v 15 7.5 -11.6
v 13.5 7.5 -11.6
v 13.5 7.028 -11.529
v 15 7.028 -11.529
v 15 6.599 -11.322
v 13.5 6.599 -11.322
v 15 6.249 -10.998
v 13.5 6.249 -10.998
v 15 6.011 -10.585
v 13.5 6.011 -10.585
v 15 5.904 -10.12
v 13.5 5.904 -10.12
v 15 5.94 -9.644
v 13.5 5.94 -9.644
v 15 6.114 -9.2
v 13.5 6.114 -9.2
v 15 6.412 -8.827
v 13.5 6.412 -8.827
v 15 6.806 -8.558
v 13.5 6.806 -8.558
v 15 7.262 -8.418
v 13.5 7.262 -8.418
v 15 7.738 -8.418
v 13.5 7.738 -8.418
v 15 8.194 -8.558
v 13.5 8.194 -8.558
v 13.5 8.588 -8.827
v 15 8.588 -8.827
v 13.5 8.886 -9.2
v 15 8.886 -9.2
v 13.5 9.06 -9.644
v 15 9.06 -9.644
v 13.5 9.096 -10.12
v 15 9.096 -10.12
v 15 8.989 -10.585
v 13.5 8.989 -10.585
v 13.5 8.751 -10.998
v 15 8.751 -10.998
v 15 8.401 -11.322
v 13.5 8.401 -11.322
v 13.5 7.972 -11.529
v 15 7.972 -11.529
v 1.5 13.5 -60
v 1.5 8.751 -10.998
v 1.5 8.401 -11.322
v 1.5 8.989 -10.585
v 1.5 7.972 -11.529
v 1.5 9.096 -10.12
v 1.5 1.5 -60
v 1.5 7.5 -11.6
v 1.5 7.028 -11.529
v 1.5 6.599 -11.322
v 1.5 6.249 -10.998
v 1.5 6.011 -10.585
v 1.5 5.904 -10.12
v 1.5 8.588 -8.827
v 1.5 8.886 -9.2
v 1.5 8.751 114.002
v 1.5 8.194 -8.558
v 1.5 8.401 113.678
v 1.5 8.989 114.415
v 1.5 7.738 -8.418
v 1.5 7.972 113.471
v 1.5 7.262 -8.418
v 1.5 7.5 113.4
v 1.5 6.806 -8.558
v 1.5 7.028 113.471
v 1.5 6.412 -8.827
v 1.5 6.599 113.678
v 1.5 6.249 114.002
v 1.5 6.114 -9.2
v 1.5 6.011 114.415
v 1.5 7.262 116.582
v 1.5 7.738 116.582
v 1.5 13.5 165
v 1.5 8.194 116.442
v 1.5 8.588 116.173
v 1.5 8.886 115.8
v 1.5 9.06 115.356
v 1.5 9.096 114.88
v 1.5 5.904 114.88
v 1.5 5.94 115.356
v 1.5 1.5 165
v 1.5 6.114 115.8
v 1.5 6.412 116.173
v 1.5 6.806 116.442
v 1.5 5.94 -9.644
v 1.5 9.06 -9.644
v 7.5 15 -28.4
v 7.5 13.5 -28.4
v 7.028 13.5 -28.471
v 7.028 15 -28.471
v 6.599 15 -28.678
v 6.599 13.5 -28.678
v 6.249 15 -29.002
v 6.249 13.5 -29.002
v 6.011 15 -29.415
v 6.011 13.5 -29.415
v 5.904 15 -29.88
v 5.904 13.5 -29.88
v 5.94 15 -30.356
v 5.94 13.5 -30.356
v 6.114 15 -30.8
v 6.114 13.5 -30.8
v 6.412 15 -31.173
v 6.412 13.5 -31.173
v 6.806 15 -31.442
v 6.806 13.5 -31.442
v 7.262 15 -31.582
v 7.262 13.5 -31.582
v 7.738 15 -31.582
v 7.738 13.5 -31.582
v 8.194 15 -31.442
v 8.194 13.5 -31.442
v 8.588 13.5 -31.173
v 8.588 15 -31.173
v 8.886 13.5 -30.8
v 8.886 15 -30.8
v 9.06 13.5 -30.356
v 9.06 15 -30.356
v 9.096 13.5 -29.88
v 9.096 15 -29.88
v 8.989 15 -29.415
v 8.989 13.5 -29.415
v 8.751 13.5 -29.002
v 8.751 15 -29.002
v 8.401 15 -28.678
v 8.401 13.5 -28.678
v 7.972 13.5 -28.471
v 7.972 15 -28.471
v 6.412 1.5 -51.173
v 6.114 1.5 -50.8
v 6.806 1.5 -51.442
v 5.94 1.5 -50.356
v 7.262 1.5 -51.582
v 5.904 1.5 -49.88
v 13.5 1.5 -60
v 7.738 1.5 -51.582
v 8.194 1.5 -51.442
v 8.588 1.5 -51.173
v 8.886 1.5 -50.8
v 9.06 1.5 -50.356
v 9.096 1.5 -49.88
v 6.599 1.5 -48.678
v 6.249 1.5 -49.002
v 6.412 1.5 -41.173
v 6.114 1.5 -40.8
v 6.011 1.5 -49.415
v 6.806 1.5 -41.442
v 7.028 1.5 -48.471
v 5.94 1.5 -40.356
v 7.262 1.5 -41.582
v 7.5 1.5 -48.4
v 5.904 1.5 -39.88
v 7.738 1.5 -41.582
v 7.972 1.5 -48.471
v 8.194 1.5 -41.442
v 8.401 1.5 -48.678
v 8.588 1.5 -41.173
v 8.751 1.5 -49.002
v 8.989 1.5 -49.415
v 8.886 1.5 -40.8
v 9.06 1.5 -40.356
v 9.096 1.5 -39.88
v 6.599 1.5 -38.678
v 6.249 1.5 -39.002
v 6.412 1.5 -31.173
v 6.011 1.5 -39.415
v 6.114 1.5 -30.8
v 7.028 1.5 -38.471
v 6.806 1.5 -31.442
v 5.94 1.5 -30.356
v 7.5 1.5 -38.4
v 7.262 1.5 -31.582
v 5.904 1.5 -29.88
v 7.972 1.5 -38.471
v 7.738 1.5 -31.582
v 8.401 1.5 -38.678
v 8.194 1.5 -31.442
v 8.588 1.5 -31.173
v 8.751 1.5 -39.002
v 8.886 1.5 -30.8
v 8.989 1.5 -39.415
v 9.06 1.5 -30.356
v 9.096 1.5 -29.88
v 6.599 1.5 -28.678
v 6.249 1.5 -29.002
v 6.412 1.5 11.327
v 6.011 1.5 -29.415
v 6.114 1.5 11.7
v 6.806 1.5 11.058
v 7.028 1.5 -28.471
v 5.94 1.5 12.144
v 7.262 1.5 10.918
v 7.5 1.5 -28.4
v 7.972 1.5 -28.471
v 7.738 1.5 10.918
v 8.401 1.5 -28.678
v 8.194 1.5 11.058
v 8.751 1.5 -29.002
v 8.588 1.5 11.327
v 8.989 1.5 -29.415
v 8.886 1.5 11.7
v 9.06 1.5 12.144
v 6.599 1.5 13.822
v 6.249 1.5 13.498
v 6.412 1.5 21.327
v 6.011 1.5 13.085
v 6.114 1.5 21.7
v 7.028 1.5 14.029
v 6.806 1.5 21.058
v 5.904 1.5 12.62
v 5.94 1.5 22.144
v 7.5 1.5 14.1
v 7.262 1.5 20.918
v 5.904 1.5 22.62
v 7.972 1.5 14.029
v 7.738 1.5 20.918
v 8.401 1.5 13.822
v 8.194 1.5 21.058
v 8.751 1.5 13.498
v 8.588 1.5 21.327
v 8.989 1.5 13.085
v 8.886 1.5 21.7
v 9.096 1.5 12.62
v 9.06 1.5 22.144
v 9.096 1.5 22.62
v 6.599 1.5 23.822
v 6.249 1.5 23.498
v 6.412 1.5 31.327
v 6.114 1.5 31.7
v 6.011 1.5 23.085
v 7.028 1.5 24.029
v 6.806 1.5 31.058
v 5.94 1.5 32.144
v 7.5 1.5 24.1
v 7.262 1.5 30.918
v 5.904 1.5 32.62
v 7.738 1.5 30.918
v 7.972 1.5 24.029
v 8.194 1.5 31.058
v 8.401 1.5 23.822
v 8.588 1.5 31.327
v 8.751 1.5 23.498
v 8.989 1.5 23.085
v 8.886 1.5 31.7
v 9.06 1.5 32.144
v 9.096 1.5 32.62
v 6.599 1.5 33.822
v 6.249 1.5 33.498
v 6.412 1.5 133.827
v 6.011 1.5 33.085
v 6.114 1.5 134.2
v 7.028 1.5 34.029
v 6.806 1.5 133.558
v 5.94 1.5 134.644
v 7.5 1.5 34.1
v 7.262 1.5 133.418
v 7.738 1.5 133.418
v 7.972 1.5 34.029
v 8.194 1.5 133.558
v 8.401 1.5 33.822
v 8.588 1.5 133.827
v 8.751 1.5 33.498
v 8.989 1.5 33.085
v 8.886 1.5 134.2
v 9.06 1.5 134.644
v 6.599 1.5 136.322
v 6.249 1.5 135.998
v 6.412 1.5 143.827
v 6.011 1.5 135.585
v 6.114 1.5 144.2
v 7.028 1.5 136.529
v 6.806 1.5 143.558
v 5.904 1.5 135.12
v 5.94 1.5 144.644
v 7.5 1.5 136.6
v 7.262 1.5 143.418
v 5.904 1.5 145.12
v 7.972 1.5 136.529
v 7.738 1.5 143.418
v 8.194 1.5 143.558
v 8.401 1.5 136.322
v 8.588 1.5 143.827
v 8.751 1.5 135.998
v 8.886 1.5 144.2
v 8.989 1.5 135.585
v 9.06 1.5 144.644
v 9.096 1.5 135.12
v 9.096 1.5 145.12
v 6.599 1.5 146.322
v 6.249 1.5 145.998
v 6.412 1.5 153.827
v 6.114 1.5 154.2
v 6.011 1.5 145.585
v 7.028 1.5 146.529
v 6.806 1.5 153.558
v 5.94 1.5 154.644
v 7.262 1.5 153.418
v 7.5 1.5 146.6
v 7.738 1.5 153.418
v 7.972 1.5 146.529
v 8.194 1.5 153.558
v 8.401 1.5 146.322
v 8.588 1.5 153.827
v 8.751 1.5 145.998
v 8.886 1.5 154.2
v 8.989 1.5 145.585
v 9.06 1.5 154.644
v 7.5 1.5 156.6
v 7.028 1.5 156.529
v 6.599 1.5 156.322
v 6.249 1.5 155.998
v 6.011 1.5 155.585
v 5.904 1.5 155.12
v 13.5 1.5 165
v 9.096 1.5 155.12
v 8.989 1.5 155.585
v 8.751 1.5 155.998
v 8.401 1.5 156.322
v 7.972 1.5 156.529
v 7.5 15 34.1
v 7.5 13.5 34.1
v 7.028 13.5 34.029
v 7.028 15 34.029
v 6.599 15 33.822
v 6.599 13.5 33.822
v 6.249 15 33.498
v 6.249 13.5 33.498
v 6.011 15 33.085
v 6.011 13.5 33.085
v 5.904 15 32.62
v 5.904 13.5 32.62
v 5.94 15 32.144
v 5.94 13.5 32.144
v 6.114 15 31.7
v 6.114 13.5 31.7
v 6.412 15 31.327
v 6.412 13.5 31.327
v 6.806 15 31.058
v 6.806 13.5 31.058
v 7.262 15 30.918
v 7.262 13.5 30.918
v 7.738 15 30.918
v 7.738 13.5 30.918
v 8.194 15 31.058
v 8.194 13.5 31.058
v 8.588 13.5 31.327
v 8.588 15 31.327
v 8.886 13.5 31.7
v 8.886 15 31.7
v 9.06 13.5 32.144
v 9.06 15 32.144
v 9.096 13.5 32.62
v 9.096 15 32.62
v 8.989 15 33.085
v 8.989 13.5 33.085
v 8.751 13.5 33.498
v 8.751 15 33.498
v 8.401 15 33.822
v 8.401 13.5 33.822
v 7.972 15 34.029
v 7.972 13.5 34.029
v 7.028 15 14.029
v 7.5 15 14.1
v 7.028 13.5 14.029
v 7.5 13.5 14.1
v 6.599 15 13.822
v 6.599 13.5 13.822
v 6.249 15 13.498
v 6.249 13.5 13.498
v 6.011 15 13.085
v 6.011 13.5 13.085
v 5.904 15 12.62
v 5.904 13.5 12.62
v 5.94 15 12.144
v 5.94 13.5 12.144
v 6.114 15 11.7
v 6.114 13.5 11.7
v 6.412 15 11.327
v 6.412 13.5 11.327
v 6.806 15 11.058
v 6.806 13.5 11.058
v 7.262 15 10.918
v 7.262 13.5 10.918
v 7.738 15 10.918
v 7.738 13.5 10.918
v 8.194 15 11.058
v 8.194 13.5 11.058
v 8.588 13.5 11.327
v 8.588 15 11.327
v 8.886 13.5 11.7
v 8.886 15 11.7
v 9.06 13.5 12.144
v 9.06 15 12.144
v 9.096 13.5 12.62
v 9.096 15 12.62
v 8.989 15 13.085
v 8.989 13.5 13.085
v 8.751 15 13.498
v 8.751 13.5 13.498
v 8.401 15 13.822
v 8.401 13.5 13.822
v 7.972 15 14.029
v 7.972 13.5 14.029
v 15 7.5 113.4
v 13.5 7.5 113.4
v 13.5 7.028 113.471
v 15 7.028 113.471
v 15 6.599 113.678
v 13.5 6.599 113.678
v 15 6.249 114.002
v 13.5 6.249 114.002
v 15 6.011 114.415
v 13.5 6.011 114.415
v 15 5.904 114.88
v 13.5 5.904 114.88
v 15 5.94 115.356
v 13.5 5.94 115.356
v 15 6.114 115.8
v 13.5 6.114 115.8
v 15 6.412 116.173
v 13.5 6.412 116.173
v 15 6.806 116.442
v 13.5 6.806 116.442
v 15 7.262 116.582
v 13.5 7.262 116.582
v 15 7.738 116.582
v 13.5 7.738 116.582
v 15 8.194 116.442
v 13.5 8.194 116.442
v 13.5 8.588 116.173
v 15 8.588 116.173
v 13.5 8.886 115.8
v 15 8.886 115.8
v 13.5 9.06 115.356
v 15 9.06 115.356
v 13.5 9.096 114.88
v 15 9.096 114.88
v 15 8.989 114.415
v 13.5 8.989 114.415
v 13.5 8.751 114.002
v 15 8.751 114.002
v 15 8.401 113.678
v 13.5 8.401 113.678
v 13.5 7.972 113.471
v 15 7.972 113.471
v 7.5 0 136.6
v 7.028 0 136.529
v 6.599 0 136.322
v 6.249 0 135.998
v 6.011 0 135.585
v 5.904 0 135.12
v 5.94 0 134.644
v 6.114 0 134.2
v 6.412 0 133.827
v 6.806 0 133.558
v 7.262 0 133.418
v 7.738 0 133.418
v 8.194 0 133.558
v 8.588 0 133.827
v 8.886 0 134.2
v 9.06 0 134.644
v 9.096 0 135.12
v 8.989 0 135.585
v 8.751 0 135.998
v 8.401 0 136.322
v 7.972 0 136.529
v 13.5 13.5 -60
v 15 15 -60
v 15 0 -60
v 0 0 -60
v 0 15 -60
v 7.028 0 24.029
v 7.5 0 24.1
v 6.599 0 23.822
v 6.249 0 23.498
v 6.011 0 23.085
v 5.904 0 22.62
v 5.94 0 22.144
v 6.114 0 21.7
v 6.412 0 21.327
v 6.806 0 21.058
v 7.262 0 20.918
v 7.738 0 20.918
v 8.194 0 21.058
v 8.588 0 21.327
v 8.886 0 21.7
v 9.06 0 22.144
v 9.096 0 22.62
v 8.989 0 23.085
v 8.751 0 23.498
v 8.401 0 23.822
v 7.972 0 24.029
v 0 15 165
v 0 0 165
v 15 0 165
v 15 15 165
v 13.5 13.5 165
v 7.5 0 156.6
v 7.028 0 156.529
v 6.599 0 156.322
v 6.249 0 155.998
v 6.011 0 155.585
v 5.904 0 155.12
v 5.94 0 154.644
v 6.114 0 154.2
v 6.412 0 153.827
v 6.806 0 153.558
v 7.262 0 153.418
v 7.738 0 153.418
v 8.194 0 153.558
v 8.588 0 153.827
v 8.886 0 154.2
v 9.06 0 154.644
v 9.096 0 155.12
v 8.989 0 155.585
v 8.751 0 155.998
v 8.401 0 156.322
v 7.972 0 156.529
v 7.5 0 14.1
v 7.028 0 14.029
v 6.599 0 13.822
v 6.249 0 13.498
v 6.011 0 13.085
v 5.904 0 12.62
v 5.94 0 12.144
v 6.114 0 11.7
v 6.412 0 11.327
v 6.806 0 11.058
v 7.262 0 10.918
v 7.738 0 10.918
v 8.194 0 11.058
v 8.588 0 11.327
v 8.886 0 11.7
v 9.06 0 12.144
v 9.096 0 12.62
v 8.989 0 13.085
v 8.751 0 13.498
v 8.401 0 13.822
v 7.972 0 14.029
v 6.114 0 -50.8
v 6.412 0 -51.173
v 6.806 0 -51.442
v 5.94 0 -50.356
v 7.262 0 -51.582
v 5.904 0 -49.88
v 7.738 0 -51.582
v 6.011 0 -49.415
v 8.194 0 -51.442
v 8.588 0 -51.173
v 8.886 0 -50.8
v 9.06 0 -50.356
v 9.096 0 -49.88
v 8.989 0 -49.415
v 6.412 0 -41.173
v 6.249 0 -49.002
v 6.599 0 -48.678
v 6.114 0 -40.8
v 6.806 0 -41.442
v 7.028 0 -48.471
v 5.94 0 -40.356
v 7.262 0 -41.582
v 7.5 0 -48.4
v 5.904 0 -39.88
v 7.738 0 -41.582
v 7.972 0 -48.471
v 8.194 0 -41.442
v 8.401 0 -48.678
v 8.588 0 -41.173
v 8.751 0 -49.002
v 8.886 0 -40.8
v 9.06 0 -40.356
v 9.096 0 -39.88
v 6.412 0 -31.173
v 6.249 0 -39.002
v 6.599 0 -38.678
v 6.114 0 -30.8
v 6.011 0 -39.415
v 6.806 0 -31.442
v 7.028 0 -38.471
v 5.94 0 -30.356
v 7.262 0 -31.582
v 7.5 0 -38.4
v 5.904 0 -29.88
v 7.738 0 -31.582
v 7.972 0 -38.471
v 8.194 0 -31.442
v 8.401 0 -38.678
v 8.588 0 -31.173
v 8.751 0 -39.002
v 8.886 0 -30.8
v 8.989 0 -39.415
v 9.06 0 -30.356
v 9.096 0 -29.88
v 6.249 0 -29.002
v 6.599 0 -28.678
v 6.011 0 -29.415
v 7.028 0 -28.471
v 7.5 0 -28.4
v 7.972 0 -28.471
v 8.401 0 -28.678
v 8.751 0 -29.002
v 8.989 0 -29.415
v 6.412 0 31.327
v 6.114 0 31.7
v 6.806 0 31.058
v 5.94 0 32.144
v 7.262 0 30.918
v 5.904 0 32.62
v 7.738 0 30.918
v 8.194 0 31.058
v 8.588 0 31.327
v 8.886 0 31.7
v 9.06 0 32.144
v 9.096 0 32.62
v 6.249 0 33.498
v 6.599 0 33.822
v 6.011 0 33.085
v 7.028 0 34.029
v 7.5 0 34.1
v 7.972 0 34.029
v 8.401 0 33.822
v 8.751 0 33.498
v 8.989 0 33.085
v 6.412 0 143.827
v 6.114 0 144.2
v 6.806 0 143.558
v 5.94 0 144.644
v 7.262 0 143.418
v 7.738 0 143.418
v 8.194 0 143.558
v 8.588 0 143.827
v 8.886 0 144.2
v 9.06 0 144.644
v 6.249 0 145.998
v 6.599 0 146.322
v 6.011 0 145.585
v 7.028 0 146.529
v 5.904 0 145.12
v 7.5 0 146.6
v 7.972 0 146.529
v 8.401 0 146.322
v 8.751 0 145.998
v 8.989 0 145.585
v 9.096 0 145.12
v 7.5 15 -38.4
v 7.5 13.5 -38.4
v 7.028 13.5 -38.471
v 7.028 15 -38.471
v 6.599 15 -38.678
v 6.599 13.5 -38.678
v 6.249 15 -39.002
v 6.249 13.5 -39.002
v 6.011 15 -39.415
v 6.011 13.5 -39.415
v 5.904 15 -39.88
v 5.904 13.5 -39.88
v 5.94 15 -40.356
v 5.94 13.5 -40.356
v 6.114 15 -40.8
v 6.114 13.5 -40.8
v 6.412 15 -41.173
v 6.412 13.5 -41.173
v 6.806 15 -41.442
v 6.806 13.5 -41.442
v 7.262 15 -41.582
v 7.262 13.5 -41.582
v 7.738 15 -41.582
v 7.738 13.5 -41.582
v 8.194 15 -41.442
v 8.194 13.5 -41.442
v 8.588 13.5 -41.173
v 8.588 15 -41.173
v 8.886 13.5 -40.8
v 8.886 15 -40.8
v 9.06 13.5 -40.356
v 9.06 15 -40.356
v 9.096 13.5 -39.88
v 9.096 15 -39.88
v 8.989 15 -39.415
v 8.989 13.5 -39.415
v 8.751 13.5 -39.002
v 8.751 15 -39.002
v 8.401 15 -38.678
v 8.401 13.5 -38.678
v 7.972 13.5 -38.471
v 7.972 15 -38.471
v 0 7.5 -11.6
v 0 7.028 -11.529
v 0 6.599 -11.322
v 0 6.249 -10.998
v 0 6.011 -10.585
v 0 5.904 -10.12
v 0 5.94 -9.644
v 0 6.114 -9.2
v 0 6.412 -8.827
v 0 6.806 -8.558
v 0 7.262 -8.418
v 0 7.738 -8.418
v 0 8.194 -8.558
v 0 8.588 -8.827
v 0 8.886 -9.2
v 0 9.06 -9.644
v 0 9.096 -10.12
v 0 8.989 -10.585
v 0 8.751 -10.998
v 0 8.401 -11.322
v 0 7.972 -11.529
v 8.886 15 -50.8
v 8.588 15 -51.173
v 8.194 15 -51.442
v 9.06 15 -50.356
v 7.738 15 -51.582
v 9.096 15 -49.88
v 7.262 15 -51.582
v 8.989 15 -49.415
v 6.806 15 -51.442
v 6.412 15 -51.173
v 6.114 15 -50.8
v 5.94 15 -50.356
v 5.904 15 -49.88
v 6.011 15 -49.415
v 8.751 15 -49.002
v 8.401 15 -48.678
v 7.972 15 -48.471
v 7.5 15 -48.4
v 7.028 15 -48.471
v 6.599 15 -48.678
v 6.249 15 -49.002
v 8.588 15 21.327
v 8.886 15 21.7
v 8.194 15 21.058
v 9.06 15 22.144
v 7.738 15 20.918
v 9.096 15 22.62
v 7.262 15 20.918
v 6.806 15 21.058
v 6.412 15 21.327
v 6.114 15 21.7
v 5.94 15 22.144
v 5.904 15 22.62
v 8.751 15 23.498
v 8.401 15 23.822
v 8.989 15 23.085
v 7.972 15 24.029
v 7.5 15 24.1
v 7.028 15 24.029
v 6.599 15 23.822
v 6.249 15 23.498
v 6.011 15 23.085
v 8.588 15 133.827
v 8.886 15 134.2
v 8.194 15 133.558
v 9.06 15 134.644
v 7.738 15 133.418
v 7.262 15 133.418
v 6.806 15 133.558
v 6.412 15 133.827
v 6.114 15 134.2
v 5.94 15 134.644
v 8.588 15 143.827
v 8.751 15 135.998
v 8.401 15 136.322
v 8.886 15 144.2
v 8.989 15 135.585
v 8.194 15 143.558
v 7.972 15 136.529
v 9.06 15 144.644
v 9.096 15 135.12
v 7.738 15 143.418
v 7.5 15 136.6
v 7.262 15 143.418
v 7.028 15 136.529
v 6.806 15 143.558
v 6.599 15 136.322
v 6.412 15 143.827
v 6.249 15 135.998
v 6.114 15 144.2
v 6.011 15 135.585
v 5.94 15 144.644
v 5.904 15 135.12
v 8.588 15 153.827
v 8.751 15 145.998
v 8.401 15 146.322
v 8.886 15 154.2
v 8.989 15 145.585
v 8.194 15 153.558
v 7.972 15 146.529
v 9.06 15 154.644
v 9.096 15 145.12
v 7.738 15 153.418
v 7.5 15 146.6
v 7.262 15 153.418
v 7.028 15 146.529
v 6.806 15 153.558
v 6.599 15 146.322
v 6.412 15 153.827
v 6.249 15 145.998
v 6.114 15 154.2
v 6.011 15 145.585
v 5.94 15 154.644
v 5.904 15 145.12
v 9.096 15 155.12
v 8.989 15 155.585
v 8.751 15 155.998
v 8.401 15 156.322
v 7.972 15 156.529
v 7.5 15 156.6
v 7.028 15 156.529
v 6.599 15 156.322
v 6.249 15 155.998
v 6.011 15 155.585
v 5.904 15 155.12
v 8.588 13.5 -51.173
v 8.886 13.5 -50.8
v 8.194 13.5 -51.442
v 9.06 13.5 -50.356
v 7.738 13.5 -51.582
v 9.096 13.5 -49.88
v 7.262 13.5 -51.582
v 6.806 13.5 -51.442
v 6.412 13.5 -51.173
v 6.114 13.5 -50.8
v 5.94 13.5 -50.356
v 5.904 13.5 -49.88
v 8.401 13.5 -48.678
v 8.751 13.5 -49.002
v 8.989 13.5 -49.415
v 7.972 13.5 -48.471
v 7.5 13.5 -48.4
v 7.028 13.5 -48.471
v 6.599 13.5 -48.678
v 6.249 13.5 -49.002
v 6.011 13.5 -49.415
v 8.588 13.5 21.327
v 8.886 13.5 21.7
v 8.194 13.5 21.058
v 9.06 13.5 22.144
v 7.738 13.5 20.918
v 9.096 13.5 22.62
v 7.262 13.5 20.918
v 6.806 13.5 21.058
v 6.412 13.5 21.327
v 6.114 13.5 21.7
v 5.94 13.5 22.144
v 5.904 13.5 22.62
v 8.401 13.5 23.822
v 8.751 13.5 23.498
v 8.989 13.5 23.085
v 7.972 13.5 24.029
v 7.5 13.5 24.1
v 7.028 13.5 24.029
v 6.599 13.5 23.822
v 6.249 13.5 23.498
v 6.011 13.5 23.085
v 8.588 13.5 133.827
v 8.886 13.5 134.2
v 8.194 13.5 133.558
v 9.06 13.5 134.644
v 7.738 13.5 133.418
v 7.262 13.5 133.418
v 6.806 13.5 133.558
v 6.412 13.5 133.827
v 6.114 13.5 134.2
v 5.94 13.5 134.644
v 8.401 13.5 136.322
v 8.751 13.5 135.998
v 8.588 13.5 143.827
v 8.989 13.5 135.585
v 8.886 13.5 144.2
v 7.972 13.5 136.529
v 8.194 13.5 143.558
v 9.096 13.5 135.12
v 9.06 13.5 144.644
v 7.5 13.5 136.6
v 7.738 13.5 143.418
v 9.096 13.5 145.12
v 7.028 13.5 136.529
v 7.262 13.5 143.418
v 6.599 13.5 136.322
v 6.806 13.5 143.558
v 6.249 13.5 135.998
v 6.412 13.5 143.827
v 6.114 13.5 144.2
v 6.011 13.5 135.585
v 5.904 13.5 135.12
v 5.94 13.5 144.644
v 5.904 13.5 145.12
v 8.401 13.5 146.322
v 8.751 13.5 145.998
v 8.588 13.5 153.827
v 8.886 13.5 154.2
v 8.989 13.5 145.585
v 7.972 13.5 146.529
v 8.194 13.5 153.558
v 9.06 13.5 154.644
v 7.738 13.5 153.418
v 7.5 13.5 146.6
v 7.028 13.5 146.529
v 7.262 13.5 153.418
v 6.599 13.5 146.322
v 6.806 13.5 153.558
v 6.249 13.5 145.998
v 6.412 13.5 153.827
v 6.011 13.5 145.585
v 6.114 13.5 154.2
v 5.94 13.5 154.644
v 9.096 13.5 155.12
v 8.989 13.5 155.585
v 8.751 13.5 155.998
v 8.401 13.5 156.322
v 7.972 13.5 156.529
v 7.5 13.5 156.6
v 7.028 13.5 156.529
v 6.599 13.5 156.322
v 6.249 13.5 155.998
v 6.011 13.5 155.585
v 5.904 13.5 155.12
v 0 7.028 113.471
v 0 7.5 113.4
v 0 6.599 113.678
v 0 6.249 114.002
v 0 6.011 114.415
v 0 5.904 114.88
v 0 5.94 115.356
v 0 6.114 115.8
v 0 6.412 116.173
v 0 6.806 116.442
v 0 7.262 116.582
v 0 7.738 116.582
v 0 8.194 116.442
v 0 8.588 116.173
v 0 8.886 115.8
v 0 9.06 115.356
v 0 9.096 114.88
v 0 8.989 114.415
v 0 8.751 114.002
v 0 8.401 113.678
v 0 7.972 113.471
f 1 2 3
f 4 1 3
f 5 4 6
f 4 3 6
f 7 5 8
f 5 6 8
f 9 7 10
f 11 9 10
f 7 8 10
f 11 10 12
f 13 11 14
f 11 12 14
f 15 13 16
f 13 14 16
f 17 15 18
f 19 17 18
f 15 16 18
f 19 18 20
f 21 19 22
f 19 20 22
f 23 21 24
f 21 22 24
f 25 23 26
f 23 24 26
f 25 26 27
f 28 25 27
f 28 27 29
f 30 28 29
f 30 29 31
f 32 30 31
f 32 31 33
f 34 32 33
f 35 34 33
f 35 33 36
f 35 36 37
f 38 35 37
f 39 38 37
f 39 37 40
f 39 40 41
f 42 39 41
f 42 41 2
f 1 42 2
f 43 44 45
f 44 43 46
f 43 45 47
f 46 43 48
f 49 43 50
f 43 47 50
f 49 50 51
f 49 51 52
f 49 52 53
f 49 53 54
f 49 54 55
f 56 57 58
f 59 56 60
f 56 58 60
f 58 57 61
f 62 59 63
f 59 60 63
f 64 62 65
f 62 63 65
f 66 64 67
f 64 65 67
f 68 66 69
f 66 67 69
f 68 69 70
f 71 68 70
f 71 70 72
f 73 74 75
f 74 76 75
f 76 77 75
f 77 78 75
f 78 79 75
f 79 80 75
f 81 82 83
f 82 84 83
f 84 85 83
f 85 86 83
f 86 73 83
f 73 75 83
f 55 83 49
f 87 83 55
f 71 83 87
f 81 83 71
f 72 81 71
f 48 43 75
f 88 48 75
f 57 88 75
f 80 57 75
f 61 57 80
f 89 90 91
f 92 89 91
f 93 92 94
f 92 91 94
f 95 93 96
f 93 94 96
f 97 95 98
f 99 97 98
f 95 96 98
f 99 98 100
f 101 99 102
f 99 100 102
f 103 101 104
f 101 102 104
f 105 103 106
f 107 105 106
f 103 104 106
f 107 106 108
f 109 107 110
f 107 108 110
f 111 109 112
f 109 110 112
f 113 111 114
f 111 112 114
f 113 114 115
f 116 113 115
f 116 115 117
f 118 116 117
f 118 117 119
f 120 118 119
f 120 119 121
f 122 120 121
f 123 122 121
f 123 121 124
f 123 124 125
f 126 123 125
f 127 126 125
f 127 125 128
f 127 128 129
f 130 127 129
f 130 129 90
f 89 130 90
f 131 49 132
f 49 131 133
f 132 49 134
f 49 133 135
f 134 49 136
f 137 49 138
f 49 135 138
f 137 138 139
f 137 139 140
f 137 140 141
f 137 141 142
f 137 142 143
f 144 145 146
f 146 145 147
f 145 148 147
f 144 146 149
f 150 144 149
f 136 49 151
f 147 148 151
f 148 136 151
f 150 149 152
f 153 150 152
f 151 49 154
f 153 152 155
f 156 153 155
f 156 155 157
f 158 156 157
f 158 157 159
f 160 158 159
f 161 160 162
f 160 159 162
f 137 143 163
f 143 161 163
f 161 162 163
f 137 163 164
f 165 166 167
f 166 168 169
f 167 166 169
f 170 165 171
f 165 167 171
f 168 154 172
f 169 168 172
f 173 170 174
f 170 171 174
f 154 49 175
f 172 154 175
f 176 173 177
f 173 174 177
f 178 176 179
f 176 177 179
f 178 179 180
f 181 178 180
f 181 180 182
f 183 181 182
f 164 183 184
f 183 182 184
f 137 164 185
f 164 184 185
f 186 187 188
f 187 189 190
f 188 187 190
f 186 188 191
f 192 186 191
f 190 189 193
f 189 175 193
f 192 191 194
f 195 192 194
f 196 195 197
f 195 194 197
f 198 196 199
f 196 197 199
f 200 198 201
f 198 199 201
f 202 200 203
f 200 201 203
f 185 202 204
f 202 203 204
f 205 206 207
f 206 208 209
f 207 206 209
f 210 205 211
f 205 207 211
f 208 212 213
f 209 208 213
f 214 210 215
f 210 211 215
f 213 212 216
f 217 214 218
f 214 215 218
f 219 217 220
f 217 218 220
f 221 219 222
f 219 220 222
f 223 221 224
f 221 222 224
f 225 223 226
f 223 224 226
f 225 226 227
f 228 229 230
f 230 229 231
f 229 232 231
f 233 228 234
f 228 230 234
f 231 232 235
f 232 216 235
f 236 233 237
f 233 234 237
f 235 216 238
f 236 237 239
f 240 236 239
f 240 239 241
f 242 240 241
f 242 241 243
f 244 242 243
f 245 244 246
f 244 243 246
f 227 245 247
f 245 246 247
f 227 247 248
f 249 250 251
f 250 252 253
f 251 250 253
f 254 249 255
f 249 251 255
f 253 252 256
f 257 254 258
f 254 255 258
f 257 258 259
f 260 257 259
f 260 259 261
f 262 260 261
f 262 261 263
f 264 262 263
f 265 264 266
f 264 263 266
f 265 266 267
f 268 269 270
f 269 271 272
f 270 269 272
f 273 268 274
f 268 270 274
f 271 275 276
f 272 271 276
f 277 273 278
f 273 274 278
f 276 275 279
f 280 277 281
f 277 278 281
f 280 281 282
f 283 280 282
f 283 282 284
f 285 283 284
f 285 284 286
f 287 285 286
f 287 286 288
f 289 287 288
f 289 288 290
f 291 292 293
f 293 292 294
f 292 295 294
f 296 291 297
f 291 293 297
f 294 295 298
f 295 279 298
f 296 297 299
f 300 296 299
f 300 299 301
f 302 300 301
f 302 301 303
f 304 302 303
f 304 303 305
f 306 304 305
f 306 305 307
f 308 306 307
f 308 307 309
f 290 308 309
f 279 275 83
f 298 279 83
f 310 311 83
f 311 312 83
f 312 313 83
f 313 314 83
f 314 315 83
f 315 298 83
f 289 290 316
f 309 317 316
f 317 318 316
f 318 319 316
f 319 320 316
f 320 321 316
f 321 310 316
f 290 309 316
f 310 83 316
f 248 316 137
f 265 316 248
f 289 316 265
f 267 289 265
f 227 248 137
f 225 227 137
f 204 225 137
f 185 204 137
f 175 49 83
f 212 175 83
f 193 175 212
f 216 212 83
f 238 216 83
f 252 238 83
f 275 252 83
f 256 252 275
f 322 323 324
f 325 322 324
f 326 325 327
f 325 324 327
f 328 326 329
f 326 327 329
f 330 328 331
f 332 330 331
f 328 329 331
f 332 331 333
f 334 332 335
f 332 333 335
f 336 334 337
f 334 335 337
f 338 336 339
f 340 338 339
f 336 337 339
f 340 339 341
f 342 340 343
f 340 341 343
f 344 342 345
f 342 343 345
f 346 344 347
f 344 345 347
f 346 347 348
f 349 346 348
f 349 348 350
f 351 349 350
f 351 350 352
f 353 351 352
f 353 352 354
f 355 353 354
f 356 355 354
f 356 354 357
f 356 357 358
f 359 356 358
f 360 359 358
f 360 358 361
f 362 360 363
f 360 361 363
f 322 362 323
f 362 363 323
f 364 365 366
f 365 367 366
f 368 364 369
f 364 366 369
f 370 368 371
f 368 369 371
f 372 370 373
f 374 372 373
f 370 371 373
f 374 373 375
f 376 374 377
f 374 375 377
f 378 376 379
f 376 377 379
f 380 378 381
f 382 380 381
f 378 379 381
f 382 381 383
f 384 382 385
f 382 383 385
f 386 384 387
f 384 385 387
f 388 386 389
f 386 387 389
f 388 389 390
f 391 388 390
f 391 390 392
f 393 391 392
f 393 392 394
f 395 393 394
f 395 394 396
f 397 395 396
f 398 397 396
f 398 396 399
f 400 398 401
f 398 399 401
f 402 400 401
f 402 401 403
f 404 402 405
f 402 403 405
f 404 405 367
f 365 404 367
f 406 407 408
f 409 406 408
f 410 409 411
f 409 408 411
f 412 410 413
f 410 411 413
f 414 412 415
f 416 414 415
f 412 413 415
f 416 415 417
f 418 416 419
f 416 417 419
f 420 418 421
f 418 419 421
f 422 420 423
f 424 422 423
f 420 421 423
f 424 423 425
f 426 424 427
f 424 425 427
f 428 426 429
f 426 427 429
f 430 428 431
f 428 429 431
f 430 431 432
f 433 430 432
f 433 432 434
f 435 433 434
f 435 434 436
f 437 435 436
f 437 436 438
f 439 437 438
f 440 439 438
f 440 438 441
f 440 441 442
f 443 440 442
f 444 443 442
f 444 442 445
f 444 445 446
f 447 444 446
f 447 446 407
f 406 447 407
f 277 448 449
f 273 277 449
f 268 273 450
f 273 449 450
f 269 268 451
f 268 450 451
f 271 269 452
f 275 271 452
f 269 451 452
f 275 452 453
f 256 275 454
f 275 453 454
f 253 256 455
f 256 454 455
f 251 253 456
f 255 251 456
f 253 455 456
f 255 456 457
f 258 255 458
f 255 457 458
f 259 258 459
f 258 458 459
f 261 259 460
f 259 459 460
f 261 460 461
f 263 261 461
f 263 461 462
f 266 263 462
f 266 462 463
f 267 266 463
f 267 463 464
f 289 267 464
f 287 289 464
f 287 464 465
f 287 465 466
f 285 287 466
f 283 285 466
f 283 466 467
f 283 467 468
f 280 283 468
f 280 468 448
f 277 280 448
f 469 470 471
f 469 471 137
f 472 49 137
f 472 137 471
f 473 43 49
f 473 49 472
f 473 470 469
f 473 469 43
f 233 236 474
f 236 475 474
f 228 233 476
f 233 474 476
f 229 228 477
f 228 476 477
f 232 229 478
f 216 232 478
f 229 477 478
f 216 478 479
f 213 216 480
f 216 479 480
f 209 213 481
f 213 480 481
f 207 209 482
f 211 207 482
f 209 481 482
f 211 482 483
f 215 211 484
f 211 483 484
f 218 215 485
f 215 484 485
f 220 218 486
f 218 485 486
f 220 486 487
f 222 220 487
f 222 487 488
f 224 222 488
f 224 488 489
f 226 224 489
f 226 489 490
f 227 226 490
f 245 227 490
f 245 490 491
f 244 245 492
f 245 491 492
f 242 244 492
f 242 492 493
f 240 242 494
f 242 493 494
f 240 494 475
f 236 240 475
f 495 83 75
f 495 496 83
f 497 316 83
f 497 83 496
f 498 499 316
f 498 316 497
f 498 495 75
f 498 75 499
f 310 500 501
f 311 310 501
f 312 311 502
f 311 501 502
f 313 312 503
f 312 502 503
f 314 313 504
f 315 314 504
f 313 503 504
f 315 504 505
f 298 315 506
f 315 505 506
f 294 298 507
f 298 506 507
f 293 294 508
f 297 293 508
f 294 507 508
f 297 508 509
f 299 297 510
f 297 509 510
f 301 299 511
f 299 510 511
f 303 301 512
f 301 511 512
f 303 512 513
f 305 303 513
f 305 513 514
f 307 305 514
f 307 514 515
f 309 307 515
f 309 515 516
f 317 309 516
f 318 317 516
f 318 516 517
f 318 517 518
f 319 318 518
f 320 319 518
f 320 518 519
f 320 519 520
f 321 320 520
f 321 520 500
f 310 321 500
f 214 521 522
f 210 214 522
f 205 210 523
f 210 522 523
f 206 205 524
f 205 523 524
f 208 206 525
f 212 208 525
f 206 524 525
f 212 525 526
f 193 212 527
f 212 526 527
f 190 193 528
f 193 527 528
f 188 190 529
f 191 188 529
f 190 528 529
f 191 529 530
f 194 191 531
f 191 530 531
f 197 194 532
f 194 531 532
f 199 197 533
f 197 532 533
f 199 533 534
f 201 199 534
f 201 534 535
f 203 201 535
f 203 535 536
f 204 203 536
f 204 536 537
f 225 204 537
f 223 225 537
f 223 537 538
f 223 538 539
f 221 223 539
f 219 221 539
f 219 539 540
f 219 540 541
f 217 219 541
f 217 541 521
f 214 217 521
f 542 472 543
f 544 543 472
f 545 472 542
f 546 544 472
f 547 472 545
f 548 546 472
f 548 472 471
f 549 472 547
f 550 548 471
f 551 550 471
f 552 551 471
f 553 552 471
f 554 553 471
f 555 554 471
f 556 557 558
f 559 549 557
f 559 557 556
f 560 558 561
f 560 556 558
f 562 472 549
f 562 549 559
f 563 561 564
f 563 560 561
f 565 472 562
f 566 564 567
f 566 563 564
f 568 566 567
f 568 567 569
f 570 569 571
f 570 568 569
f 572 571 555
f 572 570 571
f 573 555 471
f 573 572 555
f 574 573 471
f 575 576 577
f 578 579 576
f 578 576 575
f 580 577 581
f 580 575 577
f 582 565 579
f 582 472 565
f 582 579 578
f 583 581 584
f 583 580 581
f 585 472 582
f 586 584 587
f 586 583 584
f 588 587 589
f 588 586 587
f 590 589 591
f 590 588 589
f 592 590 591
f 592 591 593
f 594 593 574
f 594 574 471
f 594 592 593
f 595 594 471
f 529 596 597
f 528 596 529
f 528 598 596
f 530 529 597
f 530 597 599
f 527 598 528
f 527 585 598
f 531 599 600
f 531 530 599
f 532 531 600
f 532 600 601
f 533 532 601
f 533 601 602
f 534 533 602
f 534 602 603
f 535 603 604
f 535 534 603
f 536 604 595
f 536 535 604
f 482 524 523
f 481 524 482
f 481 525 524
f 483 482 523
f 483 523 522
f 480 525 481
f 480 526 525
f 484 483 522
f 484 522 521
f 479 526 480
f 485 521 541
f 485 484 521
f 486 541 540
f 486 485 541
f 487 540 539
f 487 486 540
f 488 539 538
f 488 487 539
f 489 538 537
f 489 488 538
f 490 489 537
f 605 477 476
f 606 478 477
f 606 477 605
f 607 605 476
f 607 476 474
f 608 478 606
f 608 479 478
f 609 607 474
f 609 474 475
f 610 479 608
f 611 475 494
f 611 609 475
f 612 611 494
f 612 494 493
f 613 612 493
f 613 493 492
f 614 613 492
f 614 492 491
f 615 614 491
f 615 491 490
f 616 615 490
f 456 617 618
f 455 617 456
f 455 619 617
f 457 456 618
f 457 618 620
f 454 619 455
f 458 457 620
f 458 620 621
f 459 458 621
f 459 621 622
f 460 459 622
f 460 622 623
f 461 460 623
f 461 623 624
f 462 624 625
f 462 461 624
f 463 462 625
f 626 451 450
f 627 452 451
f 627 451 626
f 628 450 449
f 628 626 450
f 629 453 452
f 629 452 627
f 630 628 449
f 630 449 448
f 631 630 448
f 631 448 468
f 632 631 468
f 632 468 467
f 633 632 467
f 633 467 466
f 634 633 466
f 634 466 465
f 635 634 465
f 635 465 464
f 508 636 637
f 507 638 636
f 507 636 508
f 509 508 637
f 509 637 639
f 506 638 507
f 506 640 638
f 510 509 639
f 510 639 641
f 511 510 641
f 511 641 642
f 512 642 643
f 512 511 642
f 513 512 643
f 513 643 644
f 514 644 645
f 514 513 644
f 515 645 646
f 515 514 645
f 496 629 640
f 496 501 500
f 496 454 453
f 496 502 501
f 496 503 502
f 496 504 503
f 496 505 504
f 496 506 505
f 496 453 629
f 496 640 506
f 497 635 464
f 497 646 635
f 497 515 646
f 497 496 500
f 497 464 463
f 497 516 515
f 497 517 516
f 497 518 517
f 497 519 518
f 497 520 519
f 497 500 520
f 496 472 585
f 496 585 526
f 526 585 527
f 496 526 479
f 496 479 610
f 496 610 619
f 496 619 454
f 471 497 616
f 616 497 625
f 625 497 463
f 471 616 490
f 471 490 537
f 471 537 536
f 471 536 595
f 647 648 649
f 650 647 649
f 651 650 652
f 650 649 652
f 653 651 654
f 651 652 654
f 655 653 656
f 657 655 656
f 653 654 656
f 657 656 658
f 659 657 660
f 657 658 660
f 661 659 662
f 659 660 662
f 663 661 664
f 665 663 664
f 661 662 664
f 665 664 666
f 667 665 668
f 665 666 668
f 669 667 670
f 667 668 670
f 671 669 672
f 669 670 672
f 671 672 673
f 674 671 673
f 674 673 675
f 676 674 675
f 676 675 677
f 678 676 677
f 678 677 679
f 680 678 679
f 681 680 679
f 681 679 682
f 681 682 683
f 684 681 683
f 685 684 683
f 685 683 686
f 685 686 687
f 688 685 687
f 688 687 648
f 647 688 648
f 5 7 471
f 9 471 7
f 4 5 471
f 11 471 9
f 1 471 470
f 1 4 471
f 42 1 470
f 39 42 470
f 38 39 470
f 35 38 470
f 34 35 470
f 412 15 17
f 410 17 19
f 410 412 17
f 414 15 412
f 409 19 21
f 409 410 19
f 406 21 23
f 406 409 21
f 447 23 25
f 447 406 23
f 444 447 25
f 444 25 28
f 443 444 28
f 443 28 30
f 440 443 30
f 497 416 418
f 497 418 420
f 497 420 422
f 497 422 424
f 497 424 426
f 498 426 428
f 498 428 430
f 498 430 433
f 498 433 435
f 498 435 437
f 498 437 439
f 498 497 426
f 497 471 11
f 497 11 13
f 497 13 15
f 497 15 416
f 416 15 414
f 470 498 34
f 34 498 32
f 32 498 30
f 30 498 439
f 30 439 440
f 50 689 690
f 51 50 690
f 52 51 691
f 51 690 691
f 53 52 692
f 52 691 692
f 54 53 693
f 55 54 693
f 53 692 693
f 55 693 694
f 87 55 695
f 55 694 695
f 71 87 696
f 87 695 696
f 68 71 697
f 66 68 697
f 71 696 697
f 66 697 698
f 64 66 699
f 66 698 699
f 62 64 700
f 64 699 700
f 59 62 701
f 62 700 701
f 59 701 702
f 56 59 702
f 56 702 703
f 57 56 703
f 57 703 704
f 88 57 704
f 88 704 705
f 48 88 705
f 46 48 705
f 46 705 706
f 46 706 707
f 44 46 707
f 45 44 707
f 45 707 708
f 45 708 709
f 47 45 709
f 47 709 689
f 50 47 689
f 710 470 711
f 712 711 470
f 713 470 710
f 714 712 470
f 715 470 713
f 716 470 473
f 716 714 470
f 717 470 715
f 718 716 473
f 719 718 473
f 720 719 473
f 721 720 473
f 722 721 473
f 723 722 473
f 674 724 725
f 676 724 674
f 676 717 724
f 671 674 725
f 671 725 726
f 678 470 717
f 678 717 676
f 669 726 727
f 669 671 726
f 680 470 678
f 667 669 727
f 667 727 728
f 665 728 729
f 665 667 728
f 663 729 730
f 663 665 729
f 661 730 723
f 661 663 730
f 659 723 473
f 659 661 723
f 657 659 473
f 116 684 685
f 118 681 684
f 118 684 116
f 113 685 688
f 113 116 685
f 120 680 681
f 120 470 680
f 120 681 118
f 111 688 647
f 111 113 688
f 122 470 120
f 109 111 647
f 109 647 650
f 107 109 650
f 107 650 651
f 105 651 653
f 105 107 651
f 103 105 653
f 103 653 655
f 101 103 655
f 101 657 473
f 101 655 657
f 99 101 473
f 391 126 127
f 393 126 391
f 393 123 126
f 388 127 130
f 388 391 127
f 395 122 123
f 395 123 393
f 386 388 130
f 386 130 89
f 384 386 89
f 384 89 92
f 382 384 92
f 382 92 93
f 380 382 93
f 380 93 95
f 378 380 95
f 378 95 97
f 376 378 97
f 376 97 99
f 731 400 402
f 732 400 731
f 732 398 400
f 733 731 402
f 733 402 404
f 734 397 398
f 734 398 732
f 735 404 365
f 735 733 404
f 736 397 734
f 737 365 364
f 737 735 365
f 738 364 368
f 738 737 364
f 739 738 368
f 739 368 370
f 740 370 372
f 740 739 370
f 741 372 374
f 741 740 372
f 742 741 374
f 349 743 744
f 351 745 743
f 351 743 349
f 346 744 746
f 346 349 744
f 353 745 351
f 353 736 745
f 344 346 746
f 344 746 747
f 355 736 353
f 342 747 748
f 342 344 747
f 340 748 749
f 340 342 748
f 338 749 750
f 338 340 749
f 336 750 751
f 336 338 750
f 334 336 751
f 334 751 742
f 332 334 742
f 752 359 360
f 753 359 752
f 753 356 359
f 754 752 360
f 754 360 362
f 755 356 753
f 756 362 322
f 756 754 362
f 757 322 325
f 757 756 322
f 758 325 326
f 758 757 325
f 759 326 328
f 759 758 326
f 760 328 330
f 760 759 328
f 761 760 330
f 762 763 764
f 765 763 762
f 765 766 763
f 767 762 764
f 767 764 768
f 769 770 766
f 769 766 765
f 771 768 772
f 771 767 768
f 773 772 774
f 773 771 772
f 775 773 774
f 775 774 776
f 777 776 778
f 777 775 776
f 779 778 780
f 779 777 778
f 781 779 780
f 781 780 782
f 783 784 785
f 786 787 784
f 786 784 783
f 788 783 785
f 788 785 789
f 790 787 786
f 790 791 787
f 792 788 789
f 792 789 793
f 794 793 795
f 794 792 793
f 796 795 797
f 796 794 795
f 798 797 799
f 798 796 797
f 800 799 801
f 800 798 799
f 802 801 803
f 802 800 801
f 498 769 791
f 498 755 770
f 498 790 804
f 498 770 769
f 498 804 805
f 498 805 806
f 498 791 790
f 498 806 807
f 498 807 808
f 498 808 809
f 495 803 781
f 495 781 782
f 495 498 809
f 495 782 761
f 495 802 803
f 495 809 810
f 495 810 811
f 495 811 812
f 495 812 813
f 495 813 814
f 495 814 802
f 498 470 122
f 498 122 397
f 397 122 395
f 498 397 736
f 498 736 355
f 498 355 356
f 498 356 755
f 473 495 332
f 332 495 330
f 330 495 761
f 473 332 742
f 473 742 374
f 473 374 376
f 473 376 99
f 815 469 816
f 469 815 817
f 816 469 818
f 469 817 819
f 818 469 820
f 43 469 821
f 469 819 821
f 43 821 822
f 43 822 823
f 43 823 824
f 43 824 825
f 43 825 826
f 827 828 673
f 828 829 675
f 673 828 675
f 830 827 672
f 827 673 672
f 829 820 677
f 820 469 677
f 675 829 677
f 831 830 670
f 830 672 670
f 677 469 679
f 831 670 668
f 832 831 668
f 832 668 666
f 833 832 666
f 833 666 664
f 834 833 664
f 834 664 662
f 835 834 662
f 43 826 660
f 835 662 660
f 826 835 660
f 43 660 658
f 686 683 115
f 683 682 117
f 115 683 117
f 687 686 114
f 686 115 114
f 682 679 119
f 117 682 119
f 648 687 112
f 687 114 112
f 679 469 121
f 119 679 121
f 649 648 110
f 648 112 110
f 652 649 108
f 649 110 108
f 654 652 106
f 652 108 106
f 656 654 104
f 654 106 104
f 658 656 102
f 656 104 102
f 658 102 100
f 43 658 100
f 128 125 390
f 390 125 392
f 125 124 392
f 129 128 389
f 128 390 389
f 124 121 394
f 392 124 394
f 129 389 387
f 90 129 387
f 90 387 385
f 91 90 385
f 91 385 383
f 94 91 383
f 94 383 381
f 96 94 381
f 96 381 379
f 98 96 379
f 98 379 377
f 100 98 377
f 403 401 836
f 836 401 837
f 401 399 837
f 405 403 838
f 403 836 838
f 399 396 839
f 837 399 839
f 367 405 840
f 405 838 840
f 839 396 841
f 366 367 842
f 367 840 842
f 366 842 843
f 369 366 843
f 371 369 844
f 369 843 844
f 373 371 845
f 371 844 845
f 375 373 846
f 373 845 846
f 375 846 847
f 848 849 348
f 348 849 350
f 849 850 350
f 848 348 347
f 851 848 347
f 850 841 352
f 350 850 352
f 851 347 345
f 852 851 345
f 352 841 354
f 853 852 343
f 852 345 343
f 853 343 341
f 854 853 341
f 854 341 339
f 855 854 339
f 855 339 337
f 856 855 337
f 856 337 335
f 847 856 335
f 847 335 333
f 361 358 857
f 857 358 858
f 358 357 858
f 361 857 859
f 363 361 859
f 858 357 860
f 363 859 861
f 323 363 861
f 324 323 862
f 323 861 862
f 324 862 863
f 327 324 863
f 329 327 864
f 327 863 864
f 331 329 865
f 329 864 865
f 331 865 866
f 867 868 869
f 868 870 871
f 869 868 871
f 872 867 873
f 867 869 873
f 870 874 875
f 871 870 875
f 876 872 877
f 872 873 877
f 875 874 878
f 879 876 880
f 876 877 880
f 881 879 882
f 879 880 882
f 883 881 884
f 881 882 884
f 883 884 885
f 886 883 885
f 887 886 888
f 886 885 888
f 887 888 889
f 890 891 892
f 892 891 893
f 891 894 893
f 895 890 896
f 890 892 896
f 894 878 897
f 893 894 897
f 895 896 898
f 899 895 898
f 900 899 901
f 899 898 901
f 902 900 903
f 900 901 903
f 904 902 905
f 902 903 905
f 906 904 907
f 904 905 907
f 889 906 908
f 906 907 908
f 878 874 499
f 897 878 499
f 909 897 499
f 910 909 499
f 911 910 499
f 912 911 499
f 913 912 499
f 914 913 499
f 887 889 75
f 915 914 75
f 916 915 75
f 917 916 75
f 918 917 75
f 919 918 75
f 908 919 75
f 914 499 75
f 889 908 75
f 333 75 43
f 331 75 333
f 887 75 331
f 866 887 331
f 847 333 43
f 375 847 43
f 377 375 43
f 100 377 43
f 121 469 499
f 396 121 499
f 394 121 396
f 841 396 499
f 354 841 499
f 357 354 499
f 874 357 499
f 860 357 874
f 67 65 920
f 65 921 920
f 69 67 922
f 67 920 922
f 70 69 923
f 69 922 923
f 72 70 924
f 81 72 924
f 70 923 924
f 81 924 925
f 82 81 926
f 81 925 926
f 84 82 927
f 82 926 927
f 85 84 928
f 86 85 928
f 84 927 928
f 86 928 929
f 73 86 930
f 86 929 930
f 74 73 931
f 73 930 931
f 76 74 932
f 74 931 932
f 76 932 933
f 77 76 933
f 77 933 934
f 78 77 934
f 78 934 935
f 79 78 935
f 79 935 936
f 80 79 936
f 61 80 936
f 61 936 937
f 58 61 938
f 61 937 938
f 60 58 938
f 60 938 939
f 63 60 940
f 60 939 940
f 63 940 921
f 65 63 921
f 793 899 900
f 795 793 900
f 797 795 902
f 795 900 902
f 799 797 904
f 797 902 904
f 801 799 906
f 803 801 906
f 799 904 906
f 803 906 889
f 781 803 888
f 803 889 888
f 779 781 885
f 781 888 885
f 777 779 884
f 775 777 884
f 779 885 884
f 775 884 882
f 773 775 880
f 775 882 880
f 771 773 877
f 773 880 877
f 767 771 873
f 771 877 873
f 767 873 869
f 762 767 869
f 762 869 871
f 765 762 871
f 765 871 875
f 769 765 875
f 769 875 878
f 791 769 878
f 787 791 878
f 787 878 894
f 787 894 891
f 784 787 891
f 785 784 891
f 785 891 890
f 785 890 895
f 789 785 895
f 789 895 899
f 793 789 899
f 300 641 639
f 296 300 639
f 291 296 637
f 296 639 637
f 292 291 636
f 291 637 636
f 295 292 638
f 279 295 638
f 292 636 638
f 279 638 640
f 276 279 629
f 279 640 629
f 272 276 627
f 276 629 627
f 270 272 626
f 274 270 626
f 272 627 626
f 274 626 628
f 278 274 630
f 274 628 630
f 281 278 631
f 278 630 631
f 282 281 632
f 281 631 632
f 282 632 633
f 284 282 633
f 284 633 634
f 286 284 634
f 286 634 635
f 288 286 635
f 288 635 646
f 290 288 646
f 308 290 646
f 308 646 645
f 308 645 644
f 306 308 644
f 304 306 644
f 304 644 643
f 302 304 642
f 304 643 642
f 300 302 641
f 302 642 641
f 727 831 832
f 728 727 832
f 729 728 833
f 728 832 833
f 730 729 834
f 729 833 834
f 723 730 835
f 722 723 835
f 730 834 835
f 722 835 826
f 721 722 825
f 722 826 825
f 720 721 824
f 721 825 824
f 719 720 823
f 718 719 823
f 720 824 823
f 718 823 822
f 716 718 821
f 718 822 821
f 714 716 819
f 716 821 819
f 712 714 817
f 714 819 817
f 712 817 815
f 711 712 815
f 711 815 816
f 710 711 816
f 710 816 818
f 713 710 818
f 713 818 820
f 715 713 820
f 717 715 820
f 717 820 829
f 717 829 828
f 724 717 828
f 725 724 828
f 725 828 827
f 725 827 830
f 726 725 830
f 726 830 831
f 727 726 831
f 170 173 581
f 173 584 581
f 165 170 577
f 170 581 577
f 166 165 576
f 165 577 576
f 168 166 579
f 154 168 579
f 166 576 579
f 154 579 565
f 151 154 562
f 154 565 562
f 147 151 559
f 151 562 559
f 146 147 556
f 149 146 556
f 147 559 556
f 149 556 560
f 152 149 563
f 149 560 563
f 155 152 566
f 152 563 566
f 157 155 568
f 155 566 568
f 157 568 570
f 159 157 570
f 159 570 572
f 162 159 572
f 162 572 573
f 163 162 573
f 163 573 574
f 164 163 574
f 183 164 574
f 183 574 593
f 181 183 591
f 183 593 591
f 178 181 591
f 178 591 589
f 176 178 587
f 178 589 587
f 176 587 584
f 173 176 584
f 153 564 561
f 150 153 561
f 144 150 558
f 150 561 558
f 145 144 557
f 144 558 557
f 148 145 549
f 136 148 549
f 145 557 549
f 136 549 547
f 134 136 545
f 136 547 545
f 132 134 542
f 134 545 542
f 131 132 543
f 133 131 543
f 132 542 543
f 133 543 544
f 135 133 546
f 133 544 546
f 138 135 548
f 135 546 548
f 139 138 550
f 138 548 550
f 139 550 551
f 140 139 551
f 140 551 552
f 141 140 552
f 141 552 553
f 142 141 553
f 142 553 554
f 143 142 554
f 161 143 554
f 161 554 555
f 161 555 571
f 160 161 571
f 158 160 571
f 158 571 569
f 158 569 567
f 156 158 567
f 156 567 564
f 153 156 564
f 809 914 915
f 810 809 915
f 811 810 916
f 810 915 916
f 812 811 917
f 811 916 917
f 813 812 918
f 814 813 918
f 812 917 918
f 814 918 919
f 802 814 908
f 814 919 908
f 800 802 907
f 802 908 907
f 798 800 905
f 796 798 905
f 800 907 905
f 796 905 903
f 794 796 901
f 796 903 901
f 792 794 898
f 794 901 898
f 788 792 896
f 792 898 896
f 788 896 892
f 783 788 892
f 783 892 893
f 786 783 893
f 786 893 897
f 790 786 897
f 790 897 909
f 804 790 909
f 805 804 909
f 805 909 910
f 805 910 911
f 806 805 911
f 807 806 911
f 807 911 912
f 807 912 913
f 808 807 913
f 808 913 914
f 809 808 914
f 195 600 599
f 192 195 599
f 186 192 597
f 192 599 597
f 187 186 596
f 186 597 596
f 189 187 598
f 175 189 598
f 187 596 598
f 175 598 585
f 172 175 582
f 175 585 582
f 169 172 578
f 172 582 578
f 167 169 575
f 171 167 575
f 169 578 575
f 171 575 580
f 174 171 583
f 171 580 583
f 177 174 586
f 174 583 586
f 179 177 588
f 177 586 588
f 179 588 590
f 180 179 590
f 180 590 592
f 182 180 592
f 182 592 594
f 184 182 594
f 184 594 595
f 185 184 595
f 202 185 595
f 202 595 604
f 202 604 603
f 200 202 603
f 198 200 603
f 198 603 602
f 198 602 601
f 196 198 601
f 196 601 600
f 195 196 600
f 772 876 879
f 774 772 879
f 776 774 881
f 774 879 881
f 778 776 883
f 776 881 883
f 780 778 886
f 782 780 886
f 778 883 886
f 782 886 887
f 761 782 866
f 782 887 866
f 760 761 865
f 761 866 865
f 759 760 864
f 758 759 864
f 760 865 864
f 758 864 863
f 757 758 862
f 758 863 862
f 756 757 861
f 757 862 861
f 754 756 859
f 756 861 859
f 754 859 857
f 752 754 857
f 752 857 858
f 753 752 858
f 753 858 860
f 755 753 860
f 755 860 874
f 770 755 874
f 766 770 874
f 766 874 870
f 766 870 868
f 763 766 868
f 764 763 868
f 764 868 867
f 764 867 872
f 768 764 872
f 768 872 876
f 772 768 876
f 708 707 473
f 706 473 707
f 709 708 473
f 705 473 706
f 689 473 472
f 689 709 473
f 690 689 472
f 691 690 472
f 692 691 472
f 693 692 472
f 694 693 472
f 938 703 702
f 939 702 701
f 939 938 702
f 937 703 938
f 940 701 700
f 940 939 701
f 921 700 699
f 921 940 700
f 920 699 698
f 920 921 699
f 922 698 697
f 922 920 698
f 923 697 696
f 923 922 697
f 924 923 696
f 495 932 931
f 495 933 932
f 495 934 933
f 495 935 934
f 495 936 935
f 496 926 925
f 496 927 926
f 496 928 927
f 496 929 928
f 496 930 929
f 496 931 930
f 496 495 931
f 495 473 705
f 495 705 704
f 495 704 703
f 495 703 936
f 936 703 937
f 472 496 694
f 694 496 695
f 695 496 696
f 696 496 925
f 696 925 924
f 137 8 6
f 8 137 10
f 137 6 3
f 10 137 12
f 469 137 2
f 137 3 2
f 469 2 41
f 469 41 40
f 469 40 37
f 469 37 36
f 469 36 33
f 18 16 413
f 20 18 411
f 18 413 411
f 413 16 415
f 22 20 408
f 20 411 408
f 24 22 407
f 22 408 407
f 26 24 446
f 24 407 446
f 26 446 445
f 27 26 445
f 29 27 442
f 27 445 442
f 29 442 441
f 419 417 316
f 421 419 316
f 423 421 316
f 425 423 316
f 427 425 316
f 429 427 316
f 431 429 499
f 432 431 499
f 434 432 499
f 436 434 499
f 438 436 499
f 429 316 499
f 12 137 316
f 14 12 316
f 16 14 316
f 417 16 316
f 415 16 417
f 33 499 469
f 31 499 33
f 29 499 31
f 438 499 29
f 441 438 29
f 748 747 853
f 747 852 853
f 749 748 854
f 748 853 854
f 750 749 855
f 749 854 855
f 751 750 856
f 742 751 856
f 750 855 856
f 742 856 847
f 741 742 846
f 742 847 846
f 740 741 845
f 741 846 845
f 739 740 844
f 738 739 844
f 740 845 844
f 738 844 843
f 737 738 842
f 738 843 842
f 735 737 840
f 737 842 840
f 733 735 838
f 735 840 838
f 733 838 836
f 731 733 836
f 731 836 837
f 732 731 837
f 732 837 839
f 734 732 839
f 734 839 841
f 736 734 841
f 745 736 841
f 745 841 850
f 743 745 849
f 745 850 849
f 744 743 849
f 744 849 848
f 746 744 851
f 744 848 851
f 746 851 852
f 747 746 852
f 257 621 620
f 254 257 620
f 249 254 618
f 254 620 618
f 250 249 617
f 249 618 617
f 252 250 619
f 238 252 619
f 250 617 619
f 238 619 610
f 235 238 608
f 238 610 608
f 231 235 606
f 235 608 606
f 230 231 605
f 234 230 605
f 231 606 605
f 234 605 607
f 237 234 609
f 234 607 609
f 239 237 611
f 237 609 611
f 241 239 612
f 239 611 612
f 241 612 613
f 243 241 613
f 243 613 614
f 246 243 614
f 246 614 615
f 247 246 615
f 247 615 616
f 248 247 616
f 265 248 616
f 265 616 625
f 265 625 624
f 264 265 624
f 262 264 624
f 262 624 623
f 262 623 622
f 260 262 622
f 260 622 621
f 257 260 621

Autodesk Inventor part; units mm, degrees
ref_plane "YZ Plane" through (0, 0, 0) normal (1, 0, 0) x (0, 1, 0)
ref_plane "XZ Plane" through (0, 0, 0) normal (0, 1, 0) x (-1, 0, 0)
ref_plane "XY Plane" through (0, 0, 0) normal (0, 0, 1) x (1, 0, 0)
sketch "スケッチ1" plane through (0, 0, 0) normal (0, 0, 1) x (1, 0, 0)
  line L0 (0, 0) -> (15, 0)
  line L1 (15, 0) -> (15, 15)
  line L2 (15, 15) -> (0, 15)
  line L3 (0, 15) -> (0, 0)
  dimension "d0" = 15
  dimension "d1" = 15
extrude "押し出し1" add sketch "スケッチ1" along normal blind 150
sketch "スケッチ2" plane through (0, 0, 0) normal (0, 0, -1) x (-1, 0, 0)
  line L0 (0, 0) -> (-15, 0)
  line L1 (-15, 0) -> (-15, 15)
  line L2 (-15, 15) -> (0, 15)
  line L3 (0, 15) -> (0, 0)
  dimension "d4" = 15
  dimension "d5" = 15
extrude "押し出し2" cut sketch "スケッチ2" against normal blind 30
sketch "スケッチ4" plane through (0, 0, 30) normal (0, 0, -1) x (-1, 0, 0)
  line L0 (0, 0) -> (-15, 0) projected
  line L1 (-15, 15) -> (0, 15) projected
  line L2 (0, 0) -> (-15, 0)
  line L3 (-15, 0) -> (-15, 15)
  line L4 (-15, 15) -> (0, 15)
  line L5 (0, 15) -> (0, 0)
  dimension "d8" = 15
  dimension "d9" = 15
extrude "押し出し3" add sketch "スケッチ4" along normal blind 15
sketch "スケッチ5" plane through (0, 0, 150) normal (0, 0, 1) x (1, 0, 0)
  line L0 (0, 0) -> (15, 0)
  line L1 (15, 0) -> (15, 15)
  line L2 (15, 15) -> (0, 15)
  line L3 (0, 15) -> (0, 0)
  dimension "d14" = 15
  dimension "d15" = 15
extrude "押し出し4" add sketch "スケッチ5" along normal blind 15
sketch "スケッチ6" plane through (0, 0, 15) normal (0, 0, -1) x (-1, 0, 0)
  line L0 (-15, 0) -> (0, 0) projected
  line L1 (0, 0) -> (-15, 0)
  line L2 (-15, 0) -> (-15, 15)
  line L3 (-15, 15) -> (0, 15)
  line L4 (0, 15) -> (0, 0)
  dimension "d18" = 15
  dimension "d19" = 15
extrude "押し出し5" add sketch "スケッチ6" along normal blind 55
sketch "スケッチ7" plane through (0, 0, -40) normal (0, 0, -1) x (-1, 0, 0)
  line L0 (0, 0) -> (-15, 0)
  line L1 (-15, 0) -> (-15, 15)
  line L2 (-15, 15) -> (0, 15)
  line L3 (0, 15) -> (0, 0)
  dimension "d22" = 15
  dimension "d23" = 15
extrude "押し出し6" add sketch "スケッチ7" along normal blind 3
sketch "スケッチ8" plane through (0, 0, -43) normal (0, 0, -1) x (-1, 0, 0)
  line L0 (0, 0) -> (-15, 0)
  line L1 (-15, 0) -> (-15, 15)
  line L2 (-15, 15) -> (0, 15)
  line L3 (0, 15) -> (0, 0)
  dimension "d26" = 15
  dimension "d27" = 15
extrude "押し出し7" add sketch "スケッチ8" along normal blind 2
sketch "スケッチ9" plane through (0, 15, 165) normal (0, 1, 0) x (1, 0, 0)
  circle A0 centre (7.5, 142.5) radius 1.6
  line L0 (0, 210) -> (15, 210) projected
  line L1 (0, 210) -> (0, 0) projected
  point P0 (0, 165)
  dimension "d30" = 3.2
  dimension "d31" = 67.5
  dimension "d32" = 7.5
hole "穴1" at (7.5, 15, 22.5) direction (0, -1, 0) diameter 3.2 end through all
sketch "スケッチ10" plane through (0, 0, -45) normal (0, 0, -1) x (-1, 0, 0)
  line L0 (0, 0) -> (-15, 0)
  line L1 (-15, 0) -> (-15, 15)
  line L2 (-15, 15) -> (0, 15)
  line L3 (0, 15) -> (0, 0)
extrude "押し出し8" add sketch "スケッチ10" along normal blind 15
sketch "スケッチ11" plane through (0, 15, 165) normal (0, 1, 0) x (1, 0, 0)
  line L0 (0, 225) -> (15, 225) projected
  line L1 (0, 225) -> (0, 0) projected
  point P0 (0, 165)
  point P1 (7.5, 215)
  point P2 (7.5, 205)
  point P3 (7.5, 195)
  dimension "d42" = 10
  dimension "d43" = 7.5
  dimension "d44" = 10
  dimension "d45" = 10
hole "穴2" at (7.5, 15, -50) at (7.5, 15, -40) at (7.5, 15, -30) direction (0, -1, 0) diameter 3.2 end through all
sketch "スケッチ12" plane through (15, 0, 165) normal (1, 0, 0) x (0, 0, -1)
  point P0 (165, 0)
sketch "スケッチ13" plane through (0, 15, 165) normal (0, 1, 0) x (1, 0, 0)
  line L0 (0, 225) -> (0, 0) projected
  line L1 (15, 0) -> (0, 0) projected
  line L2 (15, 225) -> (15, 0) projected
  point P0 (0, 165)
  point P1 (7.5, 10)
  point P2 (7.5, 20)
  point P3 (7.5, 30)
  dimension "d53" = 7.5
  dimension "d54" = 10
  dimension "d55" = 10
  dimension "d56" = 10
  dimension "d57" = 7.5
  dimension "d58" = 7.5
hole "穴3" at (7.5, 15, 155) at (7.5, 15, 145) at (7.5, 15, 135) direction (0, -1, 0) diameter 3.2 end through all
sketch "スケッチ14" plane through (0, 15, 165) normal (0, 1, 0) x (1, 0, 0)
  circle A0 centre (7.5, 142.5) radius 1.6 projected
  line L0 (0, 225) -> (0, 0) projected
  line L1 (15, 225) -> (15, 0) projected
  point P0 (0, 165)
  point P1 (7.5, 152.5)
  point P2 (7.5, 132.5)
  dimension "d66" = 10
  dimension "d67" = 7.5
  dimension "d68" = 10
  dimension "d69" = 7.5
hole "穴4" at (7.5, 15, 32.5) at (7.5, 15, 12.5) direction (0, -1, 0) diameter 3.2 end through all
sketch "スケッチ15" plane through (0, 0, 165) normal (0, 0, 1) x (1, 0, 0)
  line L0 (1.5, 1.5) -> (13.5, 1.5)
  line L1 (13.5, 1.5) -> (13.5, 13.5)
  line L2 (13.5, 13.5) -> (1.5, 13.5)
  line L3 (1.5, 13.5) -> (1.5, 1.5)
  line L4 (0, 0) -> (15, 0) projected
  line L5 (0, 15) -> (0, 0) projected
  dimension "d77" = 12
  dimension "d78" = 12
  dimension "d79" = 1.5
  dimension "d80" = 1.5
extrude "押し出し9" cut sketch "スケッチ15" against normal blind 1400
sketch "スケッチ16" plane through (15, 0, 165) normal (1, 0, 0) x (0, 0, -1)
  line L0 (225, 15) -> (0, 15) projected
  line L1 (225, 15) -> (225, 0) projected
  line L2 (0, 0) -> (0, 15) projected
  line L3 (225, 0) -> (0, 0) projected
  point P0 (165, 0)
  point P1 (175, 7.5)
  point P2 (50, 7.5)
  point P3 (0, 7.5)
  dimension "d83" = 7.5
  dimension "d84" = 50
  dimension "d85" = 50
  dimension "d86" = 7.5
hole "穴5" at (15, 7.5, 115) at (15, 7.5, -10) direction (-1, 0, 0) diameter 3.2 end through all
properties part number "射出_角柱3" material "アルミニウム 6061"
